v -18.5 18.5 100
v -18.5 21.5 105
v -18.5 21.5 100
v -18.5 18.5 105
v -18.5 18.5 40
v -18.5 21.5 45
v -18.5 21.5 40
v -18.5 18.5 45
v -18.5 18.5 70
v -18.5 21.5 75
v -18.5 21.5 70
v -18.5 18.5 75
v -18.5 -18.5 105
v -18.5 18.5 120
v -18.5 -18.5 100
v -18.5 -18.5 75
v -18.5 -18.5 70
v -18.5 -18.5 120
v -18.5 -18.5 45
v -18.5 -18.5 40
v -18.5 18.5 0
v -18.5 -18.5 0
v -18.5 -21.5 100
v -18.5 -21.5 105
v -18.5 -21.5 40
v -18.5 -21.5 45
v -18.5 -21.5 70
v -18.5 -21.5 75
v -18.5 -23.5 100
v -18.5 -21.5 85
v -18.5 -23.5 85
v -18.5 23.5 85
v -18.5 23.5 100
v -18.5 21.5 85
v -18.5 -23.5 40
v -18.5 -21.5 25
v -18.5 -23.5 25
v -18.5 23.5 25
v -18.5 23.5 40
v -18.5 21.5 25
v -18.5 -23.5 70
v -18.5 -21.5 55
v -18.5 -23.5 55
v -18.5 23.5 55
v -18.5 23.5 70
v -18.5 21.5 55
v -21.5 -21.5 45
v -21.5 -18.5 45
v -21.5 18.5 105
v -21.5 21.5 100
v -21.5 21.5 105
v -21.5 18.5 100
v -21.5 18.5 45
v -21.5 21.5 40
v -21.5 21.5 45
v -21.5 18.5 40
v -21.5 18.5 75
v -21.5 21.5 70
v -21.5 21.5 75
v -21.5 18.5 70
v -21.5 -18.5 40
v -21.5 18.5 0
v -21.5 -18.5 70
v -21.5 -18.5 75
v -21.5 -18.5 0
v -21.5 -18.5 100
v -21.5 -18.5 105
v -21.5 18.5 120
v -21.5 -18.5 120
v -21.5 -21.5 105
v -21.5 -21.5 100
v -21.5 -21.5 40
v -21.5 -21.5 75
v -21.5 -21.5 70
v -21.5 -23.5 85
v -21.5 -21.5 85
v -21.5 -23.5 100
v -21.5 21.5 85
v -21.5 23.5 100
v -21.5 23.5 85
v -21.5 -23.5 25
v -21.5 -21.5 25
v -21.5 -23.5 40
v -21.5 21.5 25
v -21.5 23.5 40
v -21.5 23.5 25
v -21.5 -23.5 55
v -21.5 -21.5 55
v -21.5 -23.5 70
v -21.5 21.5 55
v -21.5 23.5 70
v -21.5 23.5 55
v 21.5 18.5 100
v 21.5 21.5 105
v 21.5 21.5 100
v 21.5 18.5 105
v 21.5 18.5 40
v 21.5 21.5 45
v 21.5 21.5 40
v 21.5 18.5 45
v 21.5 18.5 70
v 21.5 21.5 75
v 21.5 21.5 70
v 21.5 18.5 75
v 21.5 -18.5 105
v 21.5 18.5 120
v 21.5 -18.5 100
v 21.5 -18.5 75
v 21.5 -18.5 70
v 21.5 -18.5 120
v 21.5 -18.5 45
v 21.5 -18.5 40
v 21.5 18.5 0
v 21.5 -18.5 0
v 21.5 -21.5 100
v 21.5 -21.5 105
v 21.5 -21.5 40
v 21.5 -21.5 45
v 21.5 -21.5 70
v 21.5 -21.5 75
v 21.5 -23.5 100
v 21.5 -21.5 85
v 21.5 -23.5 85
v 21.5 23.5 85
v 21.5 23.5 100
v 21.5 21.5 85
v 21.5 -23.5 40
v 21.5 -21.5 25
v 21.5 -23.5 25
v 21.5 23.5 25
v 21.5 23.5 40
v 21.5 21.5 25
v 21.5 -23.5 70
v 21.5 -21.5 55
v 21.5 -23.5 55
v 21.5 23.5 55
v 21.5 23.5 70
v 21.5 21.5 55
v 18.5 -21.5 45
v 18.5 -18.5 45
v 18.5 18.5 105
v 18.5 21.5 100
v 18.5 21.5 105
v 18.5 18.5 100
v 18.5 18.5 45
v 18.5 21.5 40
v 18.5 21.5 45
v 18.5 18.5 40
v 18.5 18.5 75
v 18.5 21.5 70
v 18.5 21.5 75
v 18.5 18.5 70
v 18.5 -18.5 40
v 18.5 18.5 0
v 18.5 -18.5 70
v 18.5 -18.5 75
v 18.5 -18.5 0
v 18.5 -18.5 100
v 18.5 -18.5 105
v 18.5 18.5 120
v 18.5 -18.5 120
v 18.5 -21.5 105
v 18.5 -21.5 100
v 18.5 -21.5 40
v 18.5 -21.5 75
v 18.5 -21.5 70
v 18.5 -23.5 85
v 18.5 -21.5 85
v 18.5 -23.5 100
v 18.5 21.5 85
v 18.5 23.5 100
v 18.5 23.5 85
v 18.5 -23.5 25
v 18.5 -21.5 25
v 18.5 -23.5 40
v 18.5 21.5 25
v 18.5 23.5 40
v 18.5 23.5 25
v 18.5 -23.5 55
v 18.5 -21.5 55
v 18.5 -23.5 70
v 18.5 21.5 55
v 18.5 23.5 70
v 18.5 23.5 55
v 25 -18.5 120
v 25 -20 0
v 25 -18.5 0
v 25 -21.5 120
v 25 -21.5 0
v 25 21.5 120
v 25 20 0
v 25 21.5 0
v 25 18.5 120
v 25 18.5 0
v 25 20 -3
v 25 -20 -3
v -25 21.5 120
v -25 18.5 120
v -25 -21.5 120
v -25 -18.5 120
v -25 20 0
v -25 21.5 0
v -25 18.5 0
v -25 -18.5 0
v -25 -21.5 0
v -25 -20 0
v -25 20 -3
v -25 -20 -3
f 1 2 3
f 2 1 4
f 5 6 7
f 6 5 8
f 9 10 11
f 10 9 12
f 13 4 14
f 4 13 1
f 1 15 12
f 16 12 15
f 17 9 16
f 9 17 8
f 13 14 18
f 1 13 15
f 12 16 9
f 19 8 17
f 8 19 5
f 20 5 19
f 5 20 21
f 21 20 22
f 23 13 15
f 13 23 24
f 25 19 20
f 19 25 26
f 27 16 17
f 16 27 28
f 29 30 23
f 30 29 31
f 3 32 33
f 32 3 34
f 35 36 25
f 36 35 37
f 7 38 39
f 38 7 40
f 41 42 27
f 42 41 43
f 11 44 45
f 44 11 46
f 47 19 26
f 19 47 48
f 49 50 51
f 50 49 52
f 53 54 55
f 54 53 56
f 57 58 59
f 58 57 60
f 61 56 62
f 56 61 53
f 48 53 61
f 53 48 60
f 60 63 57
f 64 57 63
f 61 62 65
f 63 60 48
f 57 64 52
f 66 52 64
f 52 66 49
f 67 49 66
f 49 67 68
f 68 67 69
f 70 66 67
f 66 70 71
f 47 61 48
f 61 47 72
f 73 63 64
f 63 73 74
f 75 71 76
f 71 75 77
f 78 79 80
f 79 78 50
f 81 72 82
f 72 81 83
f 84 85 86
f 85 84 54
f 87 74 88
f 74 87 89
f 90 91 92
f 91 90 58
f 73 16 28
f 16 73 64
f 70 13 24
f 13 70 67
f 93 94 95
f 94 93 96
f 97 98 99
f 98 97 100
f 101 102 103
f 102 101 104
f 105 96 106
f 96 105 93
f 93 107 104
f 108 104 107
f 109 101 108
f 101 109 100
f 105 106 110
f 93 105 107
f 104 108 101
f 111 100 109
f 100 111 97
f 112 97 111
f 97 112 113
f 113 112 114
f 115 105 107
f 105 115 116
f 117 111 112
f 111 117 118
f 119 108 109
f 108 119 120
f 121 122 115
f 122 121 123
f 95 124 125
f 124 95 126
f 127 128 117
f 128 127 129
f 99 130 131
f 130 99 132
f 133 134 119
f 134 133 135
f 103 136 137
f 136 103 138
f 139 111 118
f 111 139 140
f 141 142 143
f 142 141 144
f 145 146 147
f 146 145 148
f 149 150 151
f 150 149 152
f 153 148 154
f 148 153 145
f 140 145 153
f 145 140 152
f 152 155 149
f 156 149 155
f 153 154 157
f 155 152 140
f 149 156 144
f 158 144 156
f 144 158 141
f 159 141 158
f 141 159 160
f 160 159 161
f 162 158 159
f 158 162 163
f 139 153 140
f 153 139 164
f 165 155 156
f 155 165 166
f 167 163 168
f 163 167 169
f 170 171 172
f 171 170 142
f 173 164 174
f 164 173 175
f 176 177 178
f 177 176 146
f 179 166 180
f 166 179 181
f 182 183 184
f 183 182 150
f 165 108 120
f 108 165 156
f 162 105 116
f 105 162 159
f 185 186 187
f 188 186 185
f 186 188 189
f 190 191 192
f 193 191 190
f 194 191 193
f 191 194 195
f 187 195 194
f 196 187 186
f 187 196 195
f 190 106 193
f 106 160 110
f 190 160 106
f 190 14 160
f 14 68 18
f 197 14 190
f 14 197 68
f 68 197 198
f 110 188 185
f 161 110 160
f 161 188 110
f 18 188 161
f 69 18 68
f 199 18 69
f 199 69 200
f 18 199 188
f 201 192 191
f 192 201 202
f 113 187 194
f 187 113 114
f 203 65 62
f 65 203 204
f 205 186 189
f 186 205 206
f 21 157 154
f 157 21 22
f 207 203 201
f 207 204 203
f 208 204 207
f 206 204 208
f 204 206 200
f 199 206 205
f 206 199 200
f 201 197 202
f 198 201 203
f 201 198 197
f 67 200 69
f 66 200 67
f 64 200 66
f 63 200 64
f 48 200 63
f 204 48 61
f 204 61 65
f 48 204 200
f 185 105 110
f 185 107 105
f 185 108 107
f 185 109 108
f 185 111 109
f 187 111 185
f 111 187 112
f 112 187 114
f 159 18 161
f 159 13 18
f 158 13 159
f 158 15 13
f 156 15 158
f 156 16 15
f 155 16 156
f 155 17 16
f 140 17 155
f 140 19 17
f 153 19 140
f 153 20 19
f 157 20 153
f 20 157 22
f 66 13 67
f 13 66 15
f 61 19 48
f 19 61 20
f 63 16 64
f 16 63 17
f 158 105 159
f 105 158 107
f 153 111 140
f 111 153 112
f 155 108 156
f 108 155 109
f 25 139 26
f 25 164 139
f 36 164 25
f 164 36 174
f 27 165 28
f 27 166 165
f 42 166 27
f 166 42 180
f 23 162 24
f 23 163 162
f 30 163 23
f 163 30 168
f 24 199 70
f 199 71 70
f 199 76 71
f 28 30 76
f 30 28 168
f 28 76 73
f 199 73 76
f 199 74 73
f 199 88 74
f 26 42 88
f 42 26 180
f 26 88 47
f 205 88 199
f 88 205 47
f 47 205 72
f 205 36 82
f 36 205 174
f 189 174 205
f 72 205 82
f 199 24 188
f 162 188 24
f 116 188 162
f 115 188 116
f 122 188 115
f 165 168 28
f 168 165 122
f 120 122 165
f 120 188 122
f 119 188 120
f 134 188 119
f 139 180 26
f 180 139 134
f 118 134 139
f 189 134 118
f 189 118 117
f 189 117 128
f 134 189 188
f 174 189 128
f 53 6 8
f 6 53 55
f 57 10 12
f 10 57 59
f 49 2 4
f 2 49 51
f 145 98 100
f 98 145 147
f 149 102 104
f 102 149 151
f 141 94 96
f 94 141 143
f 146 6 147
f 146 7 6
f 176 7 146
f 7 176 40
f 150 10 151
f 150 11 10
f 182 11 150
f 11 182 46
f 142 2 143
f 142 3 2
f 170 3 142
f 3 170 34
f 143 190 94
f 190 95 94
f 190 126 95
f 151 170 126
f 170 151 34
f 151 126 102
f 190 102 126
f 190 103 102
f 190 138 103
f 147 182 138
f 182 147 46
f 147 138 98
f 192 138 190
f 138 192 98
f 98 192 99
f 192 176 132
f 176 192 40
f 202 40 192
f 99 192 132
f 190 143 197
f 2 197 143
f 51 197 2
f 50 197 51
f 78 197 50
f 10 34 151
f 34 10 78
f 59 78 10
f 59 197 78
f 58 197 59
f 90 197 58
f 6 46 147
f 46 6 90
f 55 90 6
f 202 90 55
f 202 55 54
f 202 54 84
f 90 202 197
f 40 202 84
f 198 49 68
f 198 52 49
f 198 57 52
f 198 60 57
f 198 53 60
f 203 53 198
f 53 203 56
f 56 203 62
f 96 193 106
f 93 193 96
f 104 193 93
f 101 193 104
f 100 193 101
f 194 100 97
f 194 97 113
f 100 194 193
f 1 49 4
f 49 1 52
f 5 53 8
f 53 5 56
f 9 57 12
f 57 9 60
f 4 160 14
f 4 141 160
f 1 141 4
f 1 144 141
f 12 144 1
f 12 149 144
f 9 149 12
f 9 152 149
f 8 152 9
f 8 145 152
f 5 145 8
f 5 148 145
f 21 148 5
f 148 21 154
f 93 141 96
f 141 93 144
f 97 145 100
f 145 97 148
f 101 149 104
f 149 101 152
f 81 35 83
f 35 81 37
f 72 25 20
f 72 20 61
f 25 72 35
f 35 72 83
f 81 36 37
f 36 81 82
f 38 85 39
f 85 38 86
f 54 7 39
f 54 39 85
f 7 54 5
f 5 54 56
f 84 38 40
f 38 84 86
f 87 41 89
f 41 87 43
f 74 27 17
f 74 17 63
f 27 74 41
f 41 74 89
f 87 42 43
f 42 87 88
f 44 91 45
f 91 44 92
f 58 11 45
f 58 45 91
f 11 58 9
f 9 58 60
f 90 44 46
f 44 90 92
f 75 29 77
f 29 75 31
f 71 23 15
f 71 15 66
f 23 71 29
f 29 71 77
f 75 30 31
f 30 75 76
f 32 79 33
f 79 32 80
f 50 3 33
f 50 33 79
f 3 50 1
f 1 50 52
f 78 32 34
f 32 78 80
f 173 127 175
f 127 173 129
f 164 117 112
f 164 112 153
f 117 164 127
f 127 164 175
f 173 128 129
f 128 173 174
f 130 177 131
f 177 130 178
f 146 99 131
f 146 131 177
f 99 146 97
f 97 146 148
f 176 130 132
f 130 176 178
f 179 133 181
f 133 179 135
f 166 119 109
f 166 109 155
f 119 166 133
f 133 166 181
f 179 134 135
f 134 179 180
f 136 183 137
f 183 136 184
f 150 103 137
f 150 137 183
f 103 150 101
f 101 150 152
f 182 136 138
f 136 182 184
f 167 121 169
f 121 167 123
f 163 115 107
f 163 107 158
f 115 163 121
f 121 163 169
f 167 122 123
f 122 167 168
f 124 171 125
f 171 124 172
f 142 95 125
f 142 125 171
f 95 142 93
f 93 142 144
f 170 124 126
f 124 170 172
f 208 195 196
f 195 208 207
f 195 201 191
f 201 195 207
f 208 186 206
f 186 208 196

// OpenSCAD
// file: face_z.scad
include <config.scad>;

/**
 * Basically just a rectangle with holes
 * X: center
 * Y: center
 * Z: top @ 0, bottom @ -material_width
 */
module face_z()
{
    color("yellow")
    translate([
        -leg_x/2,
        -leg_y/2,
        -material_width])
    cube([
        leg_x,
        leg_y,
        material_width
        ]);
}

face_z();
// file: face_y.scad
include <config.scad>;
use <hook.scad>;

/**
 * One of the two planes lying in YZ layer
 */
module face_y()
{
    color("green")
    // center
    translate([
        0,
        -(leg_y - material_width)/2,
        0
        ])
    {
        // basic rectangular face
        translate([
            -material_width/2,
            0,
            0])
            cube([
                material_width,
                leg_y - material_width,
                leg_z
                ]);

        /*
         * add joints
         */
        for (z = joint_height)
        {
            // add all the configured heights
            translate([
                0,
                0,
                z
                ])
            {
                // in the direction of -Y
                rotate([0, 0, -90])
                    joint();

                // in the direction of +Y
                translate([0, leg_y - material_width, 0])
                    rotate([0, 0, 90])
                        joint();
            }
        }
    }
}

face_y();
// file: face_x.scad
include <config.scad>;

/**
 * One of the two planes lying in XZ layer
 */
module face_x()
{
    color("red")
    difference()
    {
        // center
        translate([
            -leg_x/2,
            -material_width/2,
            0
            ])
            // basic rectangular face
            cube([
                leg_x,
                material_width,
                leg_z
                ]);

        // cut out holes for the joints
        for (x = [
                    // left and right
                    -leg_x/2 + face_y_inset,
                    +leg_x/2 - face_y_inset
                    ])
        {
            // at all the configured joint heights
            for (z = joint_height)
            {
                translate([
                    x - material_width/2,
                    -material_width,
                    z
                    ])
                    cube([
                        material_width,
                        2*material_width,
                        joint_total_height
                        ]);
            }
        }
    }
}

face_x();
// file: hook.scad
include <config.scad>;

module joint()
{
    // center in y-direction
    translate([
        0,
        -material_width/2,
        0
        ])
    {
        // main support structure
        cube([
            joint_x,
            material_width,
            joint_y
            ]);

        // add hook
        translate([
            material_width,
            0,
            -joint_hook_y
            ])
            cube([
                joint_x - material_width,
                material_width,
                joint_hook_y
                ]);
    }
}

joint();
// file: config.scad
// all measures in mm

material_x = 510;
material_y = 370;
material_width = 3;

leg_x = 50;
leg_y = 40;
leg_z = 120;

// about hoch much the faces in Y direction are inset
face_y_inset = 5;

// how far the joint extends planarly from the face
joint_x = 5;
// the lateral width of the joint
joint_y = 10;
// how far down the hook extends
joint_hook_y = 5;

joint_total_height = joint_y + joint_hook_y;

num_joints = 3;
q = leg_z/4;
joint_height = [q, 2*q, 3*q];

// how far apart from on another to project the parts
projection_spacing = 1;

// rendering quality (face number)
$fn = 50;
// main file
include <config.scad>;
use <hook.scad>;
use <face_x.scad>;
use <face_y.scad>;
use <face_z.scad>;

// font
translate([
    0,
    -leg_y/2,
    0
    ])
 face_x();

// back
translate([
    0,
    +leg_y/2,
    0
    ])
 face_x();

// left
translate([
    -leg_x/2 + face_y_inset,
    0,
    0
    ])
face_y();

// right
translate([
    +leg_x/2 - face_y_inset,
    0,
    0
    ])
face_y();

face_z();
